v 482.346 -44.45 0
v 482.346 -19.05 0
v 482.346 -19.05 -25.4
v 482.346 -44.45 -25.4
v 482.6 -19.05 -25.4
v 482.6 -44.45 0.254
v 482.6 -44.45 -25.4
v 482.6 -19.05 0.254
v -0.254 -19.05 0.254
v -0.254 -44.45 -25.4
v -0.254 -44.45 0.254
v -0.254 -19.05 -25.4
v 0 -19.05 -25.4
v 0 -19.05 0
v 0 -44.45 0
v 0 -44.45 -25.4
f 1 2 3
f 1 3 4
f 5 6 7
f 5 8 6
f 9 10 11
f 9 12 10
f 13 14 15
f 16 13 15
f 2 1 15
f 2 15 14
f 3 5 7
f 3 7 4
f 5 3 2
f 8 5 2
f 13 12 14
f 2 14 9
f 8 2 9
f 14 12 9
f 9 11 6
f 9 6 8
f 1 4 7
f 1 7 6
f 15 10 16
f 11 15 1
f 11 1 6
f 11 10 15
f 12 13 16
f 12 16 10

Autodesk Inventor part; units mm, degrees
ref_plane "YZ Plane" through (0, 0, 0) normal (1, 0, 0) x (0, 1, 0)
ref_plane "XZ Plane" through (0, 0, 0) normal (0, 1, 0) x (-1, 0, 0)
ref_plane "XY Plane" through (0, 0, 0) normal (0, 0, 1) x (1, 0, 0)
ref_plane "Work Plane1" through (0, 42.0672, 0) normal (0, 0, 1) x (1, 0, 0)
sketch "Sketch1" plane through (0, 42.0672, 0) normal (0, 0, 1) x (1, 0, 0)
  line L0 (0, -42.0672) -> (482.346, -42.0672)
  line L1 (482.346, -42.0672) -> (482.346, -67.4672)
  line L2 (482.346, -67.4672) -> (0, -67.4672)
  line L3 (0, -67.4672) -> (0, -42.0672)
  line L4 (0, -67.4672) -> (0, -61.1172)
  line L5 (0, -61.1172) -> (482.346, -61.1172)
  line L6 (482.346, -61.1172) -> (482.346, -86.5172)
  line L7 (482.346, -86.5172) -> (0, -86.5172)
  line L8 (0, -86.5172) -> (0, -61.1172)
  dimension "d0" = 482.346
  dimension "d1" = 25.4
  dimension "d2" = 6.35
  dimension "d3" = 482.346
  dimension "d4" = 25.4
extrude "Extrusion1" add sketch "Sketch1" along normal blind 0.254 contours L5 L1 L2 L3 | L2 L6 L7 L8
sketch "Sketch2" plane through (0, -44.45, 0) normal (-1, 0, 0) x (0, 0, 1)
  line L0 (0, 25.4) -> (0, 0) projected
  line L1 (0, 0) -> (0.254, 0) projected
  line L2 (0.254, 25.4) -> (0.254, 0) projected
  line L3 (0, 25.4) -> (0.254, 25.4) projected
  point P0 (0, 44.45)
extrude "Extrusion2" add sketch "Sketch2" along normal blind 0.254
sketch "Sketch3" plane through (482.346, -44.45, 0) normal (1, 0, 0) x (0, 0, -1)
  line L0 (0, 0) -> (0, 25.4) projected
  line L1 (0, 25.4) -> (-0.254, 25.4) projected
  line L2 (-0.254, 0) -> (-0.254, 25.4) projected
  line L3 (0, 0) -> (-0.254, 0) projected
  point P0 (0, 44.45)
extrude "Extrusion3" add sketch "Sketch3" along normal blind 0.254
sketch "Sketch4" plane through (0, 42.0672, 0) normal (0, 0, -1) x (-1, 0, 0)
  line L0 (-482.6, -61.1172) -> (-482.346, -61.1172)
  line L1 (-482.346, -61.1172) -> (-482.346, -86.5172)
  line L2 (-482.346, -86.5172) -> (-482.6, -86.5172)
  line L3 (-482.6, -86.5172) -> (-482.6, -61.1172)
  line L4 (0.254, -61.1172) -> (0, -61.1172)
  line L5 (0, -61.1172) -> (0, -86.5172)
  line L6 (0, -86.5172) -> (0.254, -86.5172)
  line L7 (0.254, -86.5172) -> (0.254, -61.1172)
  point P0 (0, -42.0672)
  dimension "d11" = 0.254
  dimension "d12" = 25.4
  dimension "d13" = 0.254
  dimension "d14" = 25.4
extrude "Extrusion4" add sketch "Sketch4" along normal blind 25.4
properties part number "Cloth"
